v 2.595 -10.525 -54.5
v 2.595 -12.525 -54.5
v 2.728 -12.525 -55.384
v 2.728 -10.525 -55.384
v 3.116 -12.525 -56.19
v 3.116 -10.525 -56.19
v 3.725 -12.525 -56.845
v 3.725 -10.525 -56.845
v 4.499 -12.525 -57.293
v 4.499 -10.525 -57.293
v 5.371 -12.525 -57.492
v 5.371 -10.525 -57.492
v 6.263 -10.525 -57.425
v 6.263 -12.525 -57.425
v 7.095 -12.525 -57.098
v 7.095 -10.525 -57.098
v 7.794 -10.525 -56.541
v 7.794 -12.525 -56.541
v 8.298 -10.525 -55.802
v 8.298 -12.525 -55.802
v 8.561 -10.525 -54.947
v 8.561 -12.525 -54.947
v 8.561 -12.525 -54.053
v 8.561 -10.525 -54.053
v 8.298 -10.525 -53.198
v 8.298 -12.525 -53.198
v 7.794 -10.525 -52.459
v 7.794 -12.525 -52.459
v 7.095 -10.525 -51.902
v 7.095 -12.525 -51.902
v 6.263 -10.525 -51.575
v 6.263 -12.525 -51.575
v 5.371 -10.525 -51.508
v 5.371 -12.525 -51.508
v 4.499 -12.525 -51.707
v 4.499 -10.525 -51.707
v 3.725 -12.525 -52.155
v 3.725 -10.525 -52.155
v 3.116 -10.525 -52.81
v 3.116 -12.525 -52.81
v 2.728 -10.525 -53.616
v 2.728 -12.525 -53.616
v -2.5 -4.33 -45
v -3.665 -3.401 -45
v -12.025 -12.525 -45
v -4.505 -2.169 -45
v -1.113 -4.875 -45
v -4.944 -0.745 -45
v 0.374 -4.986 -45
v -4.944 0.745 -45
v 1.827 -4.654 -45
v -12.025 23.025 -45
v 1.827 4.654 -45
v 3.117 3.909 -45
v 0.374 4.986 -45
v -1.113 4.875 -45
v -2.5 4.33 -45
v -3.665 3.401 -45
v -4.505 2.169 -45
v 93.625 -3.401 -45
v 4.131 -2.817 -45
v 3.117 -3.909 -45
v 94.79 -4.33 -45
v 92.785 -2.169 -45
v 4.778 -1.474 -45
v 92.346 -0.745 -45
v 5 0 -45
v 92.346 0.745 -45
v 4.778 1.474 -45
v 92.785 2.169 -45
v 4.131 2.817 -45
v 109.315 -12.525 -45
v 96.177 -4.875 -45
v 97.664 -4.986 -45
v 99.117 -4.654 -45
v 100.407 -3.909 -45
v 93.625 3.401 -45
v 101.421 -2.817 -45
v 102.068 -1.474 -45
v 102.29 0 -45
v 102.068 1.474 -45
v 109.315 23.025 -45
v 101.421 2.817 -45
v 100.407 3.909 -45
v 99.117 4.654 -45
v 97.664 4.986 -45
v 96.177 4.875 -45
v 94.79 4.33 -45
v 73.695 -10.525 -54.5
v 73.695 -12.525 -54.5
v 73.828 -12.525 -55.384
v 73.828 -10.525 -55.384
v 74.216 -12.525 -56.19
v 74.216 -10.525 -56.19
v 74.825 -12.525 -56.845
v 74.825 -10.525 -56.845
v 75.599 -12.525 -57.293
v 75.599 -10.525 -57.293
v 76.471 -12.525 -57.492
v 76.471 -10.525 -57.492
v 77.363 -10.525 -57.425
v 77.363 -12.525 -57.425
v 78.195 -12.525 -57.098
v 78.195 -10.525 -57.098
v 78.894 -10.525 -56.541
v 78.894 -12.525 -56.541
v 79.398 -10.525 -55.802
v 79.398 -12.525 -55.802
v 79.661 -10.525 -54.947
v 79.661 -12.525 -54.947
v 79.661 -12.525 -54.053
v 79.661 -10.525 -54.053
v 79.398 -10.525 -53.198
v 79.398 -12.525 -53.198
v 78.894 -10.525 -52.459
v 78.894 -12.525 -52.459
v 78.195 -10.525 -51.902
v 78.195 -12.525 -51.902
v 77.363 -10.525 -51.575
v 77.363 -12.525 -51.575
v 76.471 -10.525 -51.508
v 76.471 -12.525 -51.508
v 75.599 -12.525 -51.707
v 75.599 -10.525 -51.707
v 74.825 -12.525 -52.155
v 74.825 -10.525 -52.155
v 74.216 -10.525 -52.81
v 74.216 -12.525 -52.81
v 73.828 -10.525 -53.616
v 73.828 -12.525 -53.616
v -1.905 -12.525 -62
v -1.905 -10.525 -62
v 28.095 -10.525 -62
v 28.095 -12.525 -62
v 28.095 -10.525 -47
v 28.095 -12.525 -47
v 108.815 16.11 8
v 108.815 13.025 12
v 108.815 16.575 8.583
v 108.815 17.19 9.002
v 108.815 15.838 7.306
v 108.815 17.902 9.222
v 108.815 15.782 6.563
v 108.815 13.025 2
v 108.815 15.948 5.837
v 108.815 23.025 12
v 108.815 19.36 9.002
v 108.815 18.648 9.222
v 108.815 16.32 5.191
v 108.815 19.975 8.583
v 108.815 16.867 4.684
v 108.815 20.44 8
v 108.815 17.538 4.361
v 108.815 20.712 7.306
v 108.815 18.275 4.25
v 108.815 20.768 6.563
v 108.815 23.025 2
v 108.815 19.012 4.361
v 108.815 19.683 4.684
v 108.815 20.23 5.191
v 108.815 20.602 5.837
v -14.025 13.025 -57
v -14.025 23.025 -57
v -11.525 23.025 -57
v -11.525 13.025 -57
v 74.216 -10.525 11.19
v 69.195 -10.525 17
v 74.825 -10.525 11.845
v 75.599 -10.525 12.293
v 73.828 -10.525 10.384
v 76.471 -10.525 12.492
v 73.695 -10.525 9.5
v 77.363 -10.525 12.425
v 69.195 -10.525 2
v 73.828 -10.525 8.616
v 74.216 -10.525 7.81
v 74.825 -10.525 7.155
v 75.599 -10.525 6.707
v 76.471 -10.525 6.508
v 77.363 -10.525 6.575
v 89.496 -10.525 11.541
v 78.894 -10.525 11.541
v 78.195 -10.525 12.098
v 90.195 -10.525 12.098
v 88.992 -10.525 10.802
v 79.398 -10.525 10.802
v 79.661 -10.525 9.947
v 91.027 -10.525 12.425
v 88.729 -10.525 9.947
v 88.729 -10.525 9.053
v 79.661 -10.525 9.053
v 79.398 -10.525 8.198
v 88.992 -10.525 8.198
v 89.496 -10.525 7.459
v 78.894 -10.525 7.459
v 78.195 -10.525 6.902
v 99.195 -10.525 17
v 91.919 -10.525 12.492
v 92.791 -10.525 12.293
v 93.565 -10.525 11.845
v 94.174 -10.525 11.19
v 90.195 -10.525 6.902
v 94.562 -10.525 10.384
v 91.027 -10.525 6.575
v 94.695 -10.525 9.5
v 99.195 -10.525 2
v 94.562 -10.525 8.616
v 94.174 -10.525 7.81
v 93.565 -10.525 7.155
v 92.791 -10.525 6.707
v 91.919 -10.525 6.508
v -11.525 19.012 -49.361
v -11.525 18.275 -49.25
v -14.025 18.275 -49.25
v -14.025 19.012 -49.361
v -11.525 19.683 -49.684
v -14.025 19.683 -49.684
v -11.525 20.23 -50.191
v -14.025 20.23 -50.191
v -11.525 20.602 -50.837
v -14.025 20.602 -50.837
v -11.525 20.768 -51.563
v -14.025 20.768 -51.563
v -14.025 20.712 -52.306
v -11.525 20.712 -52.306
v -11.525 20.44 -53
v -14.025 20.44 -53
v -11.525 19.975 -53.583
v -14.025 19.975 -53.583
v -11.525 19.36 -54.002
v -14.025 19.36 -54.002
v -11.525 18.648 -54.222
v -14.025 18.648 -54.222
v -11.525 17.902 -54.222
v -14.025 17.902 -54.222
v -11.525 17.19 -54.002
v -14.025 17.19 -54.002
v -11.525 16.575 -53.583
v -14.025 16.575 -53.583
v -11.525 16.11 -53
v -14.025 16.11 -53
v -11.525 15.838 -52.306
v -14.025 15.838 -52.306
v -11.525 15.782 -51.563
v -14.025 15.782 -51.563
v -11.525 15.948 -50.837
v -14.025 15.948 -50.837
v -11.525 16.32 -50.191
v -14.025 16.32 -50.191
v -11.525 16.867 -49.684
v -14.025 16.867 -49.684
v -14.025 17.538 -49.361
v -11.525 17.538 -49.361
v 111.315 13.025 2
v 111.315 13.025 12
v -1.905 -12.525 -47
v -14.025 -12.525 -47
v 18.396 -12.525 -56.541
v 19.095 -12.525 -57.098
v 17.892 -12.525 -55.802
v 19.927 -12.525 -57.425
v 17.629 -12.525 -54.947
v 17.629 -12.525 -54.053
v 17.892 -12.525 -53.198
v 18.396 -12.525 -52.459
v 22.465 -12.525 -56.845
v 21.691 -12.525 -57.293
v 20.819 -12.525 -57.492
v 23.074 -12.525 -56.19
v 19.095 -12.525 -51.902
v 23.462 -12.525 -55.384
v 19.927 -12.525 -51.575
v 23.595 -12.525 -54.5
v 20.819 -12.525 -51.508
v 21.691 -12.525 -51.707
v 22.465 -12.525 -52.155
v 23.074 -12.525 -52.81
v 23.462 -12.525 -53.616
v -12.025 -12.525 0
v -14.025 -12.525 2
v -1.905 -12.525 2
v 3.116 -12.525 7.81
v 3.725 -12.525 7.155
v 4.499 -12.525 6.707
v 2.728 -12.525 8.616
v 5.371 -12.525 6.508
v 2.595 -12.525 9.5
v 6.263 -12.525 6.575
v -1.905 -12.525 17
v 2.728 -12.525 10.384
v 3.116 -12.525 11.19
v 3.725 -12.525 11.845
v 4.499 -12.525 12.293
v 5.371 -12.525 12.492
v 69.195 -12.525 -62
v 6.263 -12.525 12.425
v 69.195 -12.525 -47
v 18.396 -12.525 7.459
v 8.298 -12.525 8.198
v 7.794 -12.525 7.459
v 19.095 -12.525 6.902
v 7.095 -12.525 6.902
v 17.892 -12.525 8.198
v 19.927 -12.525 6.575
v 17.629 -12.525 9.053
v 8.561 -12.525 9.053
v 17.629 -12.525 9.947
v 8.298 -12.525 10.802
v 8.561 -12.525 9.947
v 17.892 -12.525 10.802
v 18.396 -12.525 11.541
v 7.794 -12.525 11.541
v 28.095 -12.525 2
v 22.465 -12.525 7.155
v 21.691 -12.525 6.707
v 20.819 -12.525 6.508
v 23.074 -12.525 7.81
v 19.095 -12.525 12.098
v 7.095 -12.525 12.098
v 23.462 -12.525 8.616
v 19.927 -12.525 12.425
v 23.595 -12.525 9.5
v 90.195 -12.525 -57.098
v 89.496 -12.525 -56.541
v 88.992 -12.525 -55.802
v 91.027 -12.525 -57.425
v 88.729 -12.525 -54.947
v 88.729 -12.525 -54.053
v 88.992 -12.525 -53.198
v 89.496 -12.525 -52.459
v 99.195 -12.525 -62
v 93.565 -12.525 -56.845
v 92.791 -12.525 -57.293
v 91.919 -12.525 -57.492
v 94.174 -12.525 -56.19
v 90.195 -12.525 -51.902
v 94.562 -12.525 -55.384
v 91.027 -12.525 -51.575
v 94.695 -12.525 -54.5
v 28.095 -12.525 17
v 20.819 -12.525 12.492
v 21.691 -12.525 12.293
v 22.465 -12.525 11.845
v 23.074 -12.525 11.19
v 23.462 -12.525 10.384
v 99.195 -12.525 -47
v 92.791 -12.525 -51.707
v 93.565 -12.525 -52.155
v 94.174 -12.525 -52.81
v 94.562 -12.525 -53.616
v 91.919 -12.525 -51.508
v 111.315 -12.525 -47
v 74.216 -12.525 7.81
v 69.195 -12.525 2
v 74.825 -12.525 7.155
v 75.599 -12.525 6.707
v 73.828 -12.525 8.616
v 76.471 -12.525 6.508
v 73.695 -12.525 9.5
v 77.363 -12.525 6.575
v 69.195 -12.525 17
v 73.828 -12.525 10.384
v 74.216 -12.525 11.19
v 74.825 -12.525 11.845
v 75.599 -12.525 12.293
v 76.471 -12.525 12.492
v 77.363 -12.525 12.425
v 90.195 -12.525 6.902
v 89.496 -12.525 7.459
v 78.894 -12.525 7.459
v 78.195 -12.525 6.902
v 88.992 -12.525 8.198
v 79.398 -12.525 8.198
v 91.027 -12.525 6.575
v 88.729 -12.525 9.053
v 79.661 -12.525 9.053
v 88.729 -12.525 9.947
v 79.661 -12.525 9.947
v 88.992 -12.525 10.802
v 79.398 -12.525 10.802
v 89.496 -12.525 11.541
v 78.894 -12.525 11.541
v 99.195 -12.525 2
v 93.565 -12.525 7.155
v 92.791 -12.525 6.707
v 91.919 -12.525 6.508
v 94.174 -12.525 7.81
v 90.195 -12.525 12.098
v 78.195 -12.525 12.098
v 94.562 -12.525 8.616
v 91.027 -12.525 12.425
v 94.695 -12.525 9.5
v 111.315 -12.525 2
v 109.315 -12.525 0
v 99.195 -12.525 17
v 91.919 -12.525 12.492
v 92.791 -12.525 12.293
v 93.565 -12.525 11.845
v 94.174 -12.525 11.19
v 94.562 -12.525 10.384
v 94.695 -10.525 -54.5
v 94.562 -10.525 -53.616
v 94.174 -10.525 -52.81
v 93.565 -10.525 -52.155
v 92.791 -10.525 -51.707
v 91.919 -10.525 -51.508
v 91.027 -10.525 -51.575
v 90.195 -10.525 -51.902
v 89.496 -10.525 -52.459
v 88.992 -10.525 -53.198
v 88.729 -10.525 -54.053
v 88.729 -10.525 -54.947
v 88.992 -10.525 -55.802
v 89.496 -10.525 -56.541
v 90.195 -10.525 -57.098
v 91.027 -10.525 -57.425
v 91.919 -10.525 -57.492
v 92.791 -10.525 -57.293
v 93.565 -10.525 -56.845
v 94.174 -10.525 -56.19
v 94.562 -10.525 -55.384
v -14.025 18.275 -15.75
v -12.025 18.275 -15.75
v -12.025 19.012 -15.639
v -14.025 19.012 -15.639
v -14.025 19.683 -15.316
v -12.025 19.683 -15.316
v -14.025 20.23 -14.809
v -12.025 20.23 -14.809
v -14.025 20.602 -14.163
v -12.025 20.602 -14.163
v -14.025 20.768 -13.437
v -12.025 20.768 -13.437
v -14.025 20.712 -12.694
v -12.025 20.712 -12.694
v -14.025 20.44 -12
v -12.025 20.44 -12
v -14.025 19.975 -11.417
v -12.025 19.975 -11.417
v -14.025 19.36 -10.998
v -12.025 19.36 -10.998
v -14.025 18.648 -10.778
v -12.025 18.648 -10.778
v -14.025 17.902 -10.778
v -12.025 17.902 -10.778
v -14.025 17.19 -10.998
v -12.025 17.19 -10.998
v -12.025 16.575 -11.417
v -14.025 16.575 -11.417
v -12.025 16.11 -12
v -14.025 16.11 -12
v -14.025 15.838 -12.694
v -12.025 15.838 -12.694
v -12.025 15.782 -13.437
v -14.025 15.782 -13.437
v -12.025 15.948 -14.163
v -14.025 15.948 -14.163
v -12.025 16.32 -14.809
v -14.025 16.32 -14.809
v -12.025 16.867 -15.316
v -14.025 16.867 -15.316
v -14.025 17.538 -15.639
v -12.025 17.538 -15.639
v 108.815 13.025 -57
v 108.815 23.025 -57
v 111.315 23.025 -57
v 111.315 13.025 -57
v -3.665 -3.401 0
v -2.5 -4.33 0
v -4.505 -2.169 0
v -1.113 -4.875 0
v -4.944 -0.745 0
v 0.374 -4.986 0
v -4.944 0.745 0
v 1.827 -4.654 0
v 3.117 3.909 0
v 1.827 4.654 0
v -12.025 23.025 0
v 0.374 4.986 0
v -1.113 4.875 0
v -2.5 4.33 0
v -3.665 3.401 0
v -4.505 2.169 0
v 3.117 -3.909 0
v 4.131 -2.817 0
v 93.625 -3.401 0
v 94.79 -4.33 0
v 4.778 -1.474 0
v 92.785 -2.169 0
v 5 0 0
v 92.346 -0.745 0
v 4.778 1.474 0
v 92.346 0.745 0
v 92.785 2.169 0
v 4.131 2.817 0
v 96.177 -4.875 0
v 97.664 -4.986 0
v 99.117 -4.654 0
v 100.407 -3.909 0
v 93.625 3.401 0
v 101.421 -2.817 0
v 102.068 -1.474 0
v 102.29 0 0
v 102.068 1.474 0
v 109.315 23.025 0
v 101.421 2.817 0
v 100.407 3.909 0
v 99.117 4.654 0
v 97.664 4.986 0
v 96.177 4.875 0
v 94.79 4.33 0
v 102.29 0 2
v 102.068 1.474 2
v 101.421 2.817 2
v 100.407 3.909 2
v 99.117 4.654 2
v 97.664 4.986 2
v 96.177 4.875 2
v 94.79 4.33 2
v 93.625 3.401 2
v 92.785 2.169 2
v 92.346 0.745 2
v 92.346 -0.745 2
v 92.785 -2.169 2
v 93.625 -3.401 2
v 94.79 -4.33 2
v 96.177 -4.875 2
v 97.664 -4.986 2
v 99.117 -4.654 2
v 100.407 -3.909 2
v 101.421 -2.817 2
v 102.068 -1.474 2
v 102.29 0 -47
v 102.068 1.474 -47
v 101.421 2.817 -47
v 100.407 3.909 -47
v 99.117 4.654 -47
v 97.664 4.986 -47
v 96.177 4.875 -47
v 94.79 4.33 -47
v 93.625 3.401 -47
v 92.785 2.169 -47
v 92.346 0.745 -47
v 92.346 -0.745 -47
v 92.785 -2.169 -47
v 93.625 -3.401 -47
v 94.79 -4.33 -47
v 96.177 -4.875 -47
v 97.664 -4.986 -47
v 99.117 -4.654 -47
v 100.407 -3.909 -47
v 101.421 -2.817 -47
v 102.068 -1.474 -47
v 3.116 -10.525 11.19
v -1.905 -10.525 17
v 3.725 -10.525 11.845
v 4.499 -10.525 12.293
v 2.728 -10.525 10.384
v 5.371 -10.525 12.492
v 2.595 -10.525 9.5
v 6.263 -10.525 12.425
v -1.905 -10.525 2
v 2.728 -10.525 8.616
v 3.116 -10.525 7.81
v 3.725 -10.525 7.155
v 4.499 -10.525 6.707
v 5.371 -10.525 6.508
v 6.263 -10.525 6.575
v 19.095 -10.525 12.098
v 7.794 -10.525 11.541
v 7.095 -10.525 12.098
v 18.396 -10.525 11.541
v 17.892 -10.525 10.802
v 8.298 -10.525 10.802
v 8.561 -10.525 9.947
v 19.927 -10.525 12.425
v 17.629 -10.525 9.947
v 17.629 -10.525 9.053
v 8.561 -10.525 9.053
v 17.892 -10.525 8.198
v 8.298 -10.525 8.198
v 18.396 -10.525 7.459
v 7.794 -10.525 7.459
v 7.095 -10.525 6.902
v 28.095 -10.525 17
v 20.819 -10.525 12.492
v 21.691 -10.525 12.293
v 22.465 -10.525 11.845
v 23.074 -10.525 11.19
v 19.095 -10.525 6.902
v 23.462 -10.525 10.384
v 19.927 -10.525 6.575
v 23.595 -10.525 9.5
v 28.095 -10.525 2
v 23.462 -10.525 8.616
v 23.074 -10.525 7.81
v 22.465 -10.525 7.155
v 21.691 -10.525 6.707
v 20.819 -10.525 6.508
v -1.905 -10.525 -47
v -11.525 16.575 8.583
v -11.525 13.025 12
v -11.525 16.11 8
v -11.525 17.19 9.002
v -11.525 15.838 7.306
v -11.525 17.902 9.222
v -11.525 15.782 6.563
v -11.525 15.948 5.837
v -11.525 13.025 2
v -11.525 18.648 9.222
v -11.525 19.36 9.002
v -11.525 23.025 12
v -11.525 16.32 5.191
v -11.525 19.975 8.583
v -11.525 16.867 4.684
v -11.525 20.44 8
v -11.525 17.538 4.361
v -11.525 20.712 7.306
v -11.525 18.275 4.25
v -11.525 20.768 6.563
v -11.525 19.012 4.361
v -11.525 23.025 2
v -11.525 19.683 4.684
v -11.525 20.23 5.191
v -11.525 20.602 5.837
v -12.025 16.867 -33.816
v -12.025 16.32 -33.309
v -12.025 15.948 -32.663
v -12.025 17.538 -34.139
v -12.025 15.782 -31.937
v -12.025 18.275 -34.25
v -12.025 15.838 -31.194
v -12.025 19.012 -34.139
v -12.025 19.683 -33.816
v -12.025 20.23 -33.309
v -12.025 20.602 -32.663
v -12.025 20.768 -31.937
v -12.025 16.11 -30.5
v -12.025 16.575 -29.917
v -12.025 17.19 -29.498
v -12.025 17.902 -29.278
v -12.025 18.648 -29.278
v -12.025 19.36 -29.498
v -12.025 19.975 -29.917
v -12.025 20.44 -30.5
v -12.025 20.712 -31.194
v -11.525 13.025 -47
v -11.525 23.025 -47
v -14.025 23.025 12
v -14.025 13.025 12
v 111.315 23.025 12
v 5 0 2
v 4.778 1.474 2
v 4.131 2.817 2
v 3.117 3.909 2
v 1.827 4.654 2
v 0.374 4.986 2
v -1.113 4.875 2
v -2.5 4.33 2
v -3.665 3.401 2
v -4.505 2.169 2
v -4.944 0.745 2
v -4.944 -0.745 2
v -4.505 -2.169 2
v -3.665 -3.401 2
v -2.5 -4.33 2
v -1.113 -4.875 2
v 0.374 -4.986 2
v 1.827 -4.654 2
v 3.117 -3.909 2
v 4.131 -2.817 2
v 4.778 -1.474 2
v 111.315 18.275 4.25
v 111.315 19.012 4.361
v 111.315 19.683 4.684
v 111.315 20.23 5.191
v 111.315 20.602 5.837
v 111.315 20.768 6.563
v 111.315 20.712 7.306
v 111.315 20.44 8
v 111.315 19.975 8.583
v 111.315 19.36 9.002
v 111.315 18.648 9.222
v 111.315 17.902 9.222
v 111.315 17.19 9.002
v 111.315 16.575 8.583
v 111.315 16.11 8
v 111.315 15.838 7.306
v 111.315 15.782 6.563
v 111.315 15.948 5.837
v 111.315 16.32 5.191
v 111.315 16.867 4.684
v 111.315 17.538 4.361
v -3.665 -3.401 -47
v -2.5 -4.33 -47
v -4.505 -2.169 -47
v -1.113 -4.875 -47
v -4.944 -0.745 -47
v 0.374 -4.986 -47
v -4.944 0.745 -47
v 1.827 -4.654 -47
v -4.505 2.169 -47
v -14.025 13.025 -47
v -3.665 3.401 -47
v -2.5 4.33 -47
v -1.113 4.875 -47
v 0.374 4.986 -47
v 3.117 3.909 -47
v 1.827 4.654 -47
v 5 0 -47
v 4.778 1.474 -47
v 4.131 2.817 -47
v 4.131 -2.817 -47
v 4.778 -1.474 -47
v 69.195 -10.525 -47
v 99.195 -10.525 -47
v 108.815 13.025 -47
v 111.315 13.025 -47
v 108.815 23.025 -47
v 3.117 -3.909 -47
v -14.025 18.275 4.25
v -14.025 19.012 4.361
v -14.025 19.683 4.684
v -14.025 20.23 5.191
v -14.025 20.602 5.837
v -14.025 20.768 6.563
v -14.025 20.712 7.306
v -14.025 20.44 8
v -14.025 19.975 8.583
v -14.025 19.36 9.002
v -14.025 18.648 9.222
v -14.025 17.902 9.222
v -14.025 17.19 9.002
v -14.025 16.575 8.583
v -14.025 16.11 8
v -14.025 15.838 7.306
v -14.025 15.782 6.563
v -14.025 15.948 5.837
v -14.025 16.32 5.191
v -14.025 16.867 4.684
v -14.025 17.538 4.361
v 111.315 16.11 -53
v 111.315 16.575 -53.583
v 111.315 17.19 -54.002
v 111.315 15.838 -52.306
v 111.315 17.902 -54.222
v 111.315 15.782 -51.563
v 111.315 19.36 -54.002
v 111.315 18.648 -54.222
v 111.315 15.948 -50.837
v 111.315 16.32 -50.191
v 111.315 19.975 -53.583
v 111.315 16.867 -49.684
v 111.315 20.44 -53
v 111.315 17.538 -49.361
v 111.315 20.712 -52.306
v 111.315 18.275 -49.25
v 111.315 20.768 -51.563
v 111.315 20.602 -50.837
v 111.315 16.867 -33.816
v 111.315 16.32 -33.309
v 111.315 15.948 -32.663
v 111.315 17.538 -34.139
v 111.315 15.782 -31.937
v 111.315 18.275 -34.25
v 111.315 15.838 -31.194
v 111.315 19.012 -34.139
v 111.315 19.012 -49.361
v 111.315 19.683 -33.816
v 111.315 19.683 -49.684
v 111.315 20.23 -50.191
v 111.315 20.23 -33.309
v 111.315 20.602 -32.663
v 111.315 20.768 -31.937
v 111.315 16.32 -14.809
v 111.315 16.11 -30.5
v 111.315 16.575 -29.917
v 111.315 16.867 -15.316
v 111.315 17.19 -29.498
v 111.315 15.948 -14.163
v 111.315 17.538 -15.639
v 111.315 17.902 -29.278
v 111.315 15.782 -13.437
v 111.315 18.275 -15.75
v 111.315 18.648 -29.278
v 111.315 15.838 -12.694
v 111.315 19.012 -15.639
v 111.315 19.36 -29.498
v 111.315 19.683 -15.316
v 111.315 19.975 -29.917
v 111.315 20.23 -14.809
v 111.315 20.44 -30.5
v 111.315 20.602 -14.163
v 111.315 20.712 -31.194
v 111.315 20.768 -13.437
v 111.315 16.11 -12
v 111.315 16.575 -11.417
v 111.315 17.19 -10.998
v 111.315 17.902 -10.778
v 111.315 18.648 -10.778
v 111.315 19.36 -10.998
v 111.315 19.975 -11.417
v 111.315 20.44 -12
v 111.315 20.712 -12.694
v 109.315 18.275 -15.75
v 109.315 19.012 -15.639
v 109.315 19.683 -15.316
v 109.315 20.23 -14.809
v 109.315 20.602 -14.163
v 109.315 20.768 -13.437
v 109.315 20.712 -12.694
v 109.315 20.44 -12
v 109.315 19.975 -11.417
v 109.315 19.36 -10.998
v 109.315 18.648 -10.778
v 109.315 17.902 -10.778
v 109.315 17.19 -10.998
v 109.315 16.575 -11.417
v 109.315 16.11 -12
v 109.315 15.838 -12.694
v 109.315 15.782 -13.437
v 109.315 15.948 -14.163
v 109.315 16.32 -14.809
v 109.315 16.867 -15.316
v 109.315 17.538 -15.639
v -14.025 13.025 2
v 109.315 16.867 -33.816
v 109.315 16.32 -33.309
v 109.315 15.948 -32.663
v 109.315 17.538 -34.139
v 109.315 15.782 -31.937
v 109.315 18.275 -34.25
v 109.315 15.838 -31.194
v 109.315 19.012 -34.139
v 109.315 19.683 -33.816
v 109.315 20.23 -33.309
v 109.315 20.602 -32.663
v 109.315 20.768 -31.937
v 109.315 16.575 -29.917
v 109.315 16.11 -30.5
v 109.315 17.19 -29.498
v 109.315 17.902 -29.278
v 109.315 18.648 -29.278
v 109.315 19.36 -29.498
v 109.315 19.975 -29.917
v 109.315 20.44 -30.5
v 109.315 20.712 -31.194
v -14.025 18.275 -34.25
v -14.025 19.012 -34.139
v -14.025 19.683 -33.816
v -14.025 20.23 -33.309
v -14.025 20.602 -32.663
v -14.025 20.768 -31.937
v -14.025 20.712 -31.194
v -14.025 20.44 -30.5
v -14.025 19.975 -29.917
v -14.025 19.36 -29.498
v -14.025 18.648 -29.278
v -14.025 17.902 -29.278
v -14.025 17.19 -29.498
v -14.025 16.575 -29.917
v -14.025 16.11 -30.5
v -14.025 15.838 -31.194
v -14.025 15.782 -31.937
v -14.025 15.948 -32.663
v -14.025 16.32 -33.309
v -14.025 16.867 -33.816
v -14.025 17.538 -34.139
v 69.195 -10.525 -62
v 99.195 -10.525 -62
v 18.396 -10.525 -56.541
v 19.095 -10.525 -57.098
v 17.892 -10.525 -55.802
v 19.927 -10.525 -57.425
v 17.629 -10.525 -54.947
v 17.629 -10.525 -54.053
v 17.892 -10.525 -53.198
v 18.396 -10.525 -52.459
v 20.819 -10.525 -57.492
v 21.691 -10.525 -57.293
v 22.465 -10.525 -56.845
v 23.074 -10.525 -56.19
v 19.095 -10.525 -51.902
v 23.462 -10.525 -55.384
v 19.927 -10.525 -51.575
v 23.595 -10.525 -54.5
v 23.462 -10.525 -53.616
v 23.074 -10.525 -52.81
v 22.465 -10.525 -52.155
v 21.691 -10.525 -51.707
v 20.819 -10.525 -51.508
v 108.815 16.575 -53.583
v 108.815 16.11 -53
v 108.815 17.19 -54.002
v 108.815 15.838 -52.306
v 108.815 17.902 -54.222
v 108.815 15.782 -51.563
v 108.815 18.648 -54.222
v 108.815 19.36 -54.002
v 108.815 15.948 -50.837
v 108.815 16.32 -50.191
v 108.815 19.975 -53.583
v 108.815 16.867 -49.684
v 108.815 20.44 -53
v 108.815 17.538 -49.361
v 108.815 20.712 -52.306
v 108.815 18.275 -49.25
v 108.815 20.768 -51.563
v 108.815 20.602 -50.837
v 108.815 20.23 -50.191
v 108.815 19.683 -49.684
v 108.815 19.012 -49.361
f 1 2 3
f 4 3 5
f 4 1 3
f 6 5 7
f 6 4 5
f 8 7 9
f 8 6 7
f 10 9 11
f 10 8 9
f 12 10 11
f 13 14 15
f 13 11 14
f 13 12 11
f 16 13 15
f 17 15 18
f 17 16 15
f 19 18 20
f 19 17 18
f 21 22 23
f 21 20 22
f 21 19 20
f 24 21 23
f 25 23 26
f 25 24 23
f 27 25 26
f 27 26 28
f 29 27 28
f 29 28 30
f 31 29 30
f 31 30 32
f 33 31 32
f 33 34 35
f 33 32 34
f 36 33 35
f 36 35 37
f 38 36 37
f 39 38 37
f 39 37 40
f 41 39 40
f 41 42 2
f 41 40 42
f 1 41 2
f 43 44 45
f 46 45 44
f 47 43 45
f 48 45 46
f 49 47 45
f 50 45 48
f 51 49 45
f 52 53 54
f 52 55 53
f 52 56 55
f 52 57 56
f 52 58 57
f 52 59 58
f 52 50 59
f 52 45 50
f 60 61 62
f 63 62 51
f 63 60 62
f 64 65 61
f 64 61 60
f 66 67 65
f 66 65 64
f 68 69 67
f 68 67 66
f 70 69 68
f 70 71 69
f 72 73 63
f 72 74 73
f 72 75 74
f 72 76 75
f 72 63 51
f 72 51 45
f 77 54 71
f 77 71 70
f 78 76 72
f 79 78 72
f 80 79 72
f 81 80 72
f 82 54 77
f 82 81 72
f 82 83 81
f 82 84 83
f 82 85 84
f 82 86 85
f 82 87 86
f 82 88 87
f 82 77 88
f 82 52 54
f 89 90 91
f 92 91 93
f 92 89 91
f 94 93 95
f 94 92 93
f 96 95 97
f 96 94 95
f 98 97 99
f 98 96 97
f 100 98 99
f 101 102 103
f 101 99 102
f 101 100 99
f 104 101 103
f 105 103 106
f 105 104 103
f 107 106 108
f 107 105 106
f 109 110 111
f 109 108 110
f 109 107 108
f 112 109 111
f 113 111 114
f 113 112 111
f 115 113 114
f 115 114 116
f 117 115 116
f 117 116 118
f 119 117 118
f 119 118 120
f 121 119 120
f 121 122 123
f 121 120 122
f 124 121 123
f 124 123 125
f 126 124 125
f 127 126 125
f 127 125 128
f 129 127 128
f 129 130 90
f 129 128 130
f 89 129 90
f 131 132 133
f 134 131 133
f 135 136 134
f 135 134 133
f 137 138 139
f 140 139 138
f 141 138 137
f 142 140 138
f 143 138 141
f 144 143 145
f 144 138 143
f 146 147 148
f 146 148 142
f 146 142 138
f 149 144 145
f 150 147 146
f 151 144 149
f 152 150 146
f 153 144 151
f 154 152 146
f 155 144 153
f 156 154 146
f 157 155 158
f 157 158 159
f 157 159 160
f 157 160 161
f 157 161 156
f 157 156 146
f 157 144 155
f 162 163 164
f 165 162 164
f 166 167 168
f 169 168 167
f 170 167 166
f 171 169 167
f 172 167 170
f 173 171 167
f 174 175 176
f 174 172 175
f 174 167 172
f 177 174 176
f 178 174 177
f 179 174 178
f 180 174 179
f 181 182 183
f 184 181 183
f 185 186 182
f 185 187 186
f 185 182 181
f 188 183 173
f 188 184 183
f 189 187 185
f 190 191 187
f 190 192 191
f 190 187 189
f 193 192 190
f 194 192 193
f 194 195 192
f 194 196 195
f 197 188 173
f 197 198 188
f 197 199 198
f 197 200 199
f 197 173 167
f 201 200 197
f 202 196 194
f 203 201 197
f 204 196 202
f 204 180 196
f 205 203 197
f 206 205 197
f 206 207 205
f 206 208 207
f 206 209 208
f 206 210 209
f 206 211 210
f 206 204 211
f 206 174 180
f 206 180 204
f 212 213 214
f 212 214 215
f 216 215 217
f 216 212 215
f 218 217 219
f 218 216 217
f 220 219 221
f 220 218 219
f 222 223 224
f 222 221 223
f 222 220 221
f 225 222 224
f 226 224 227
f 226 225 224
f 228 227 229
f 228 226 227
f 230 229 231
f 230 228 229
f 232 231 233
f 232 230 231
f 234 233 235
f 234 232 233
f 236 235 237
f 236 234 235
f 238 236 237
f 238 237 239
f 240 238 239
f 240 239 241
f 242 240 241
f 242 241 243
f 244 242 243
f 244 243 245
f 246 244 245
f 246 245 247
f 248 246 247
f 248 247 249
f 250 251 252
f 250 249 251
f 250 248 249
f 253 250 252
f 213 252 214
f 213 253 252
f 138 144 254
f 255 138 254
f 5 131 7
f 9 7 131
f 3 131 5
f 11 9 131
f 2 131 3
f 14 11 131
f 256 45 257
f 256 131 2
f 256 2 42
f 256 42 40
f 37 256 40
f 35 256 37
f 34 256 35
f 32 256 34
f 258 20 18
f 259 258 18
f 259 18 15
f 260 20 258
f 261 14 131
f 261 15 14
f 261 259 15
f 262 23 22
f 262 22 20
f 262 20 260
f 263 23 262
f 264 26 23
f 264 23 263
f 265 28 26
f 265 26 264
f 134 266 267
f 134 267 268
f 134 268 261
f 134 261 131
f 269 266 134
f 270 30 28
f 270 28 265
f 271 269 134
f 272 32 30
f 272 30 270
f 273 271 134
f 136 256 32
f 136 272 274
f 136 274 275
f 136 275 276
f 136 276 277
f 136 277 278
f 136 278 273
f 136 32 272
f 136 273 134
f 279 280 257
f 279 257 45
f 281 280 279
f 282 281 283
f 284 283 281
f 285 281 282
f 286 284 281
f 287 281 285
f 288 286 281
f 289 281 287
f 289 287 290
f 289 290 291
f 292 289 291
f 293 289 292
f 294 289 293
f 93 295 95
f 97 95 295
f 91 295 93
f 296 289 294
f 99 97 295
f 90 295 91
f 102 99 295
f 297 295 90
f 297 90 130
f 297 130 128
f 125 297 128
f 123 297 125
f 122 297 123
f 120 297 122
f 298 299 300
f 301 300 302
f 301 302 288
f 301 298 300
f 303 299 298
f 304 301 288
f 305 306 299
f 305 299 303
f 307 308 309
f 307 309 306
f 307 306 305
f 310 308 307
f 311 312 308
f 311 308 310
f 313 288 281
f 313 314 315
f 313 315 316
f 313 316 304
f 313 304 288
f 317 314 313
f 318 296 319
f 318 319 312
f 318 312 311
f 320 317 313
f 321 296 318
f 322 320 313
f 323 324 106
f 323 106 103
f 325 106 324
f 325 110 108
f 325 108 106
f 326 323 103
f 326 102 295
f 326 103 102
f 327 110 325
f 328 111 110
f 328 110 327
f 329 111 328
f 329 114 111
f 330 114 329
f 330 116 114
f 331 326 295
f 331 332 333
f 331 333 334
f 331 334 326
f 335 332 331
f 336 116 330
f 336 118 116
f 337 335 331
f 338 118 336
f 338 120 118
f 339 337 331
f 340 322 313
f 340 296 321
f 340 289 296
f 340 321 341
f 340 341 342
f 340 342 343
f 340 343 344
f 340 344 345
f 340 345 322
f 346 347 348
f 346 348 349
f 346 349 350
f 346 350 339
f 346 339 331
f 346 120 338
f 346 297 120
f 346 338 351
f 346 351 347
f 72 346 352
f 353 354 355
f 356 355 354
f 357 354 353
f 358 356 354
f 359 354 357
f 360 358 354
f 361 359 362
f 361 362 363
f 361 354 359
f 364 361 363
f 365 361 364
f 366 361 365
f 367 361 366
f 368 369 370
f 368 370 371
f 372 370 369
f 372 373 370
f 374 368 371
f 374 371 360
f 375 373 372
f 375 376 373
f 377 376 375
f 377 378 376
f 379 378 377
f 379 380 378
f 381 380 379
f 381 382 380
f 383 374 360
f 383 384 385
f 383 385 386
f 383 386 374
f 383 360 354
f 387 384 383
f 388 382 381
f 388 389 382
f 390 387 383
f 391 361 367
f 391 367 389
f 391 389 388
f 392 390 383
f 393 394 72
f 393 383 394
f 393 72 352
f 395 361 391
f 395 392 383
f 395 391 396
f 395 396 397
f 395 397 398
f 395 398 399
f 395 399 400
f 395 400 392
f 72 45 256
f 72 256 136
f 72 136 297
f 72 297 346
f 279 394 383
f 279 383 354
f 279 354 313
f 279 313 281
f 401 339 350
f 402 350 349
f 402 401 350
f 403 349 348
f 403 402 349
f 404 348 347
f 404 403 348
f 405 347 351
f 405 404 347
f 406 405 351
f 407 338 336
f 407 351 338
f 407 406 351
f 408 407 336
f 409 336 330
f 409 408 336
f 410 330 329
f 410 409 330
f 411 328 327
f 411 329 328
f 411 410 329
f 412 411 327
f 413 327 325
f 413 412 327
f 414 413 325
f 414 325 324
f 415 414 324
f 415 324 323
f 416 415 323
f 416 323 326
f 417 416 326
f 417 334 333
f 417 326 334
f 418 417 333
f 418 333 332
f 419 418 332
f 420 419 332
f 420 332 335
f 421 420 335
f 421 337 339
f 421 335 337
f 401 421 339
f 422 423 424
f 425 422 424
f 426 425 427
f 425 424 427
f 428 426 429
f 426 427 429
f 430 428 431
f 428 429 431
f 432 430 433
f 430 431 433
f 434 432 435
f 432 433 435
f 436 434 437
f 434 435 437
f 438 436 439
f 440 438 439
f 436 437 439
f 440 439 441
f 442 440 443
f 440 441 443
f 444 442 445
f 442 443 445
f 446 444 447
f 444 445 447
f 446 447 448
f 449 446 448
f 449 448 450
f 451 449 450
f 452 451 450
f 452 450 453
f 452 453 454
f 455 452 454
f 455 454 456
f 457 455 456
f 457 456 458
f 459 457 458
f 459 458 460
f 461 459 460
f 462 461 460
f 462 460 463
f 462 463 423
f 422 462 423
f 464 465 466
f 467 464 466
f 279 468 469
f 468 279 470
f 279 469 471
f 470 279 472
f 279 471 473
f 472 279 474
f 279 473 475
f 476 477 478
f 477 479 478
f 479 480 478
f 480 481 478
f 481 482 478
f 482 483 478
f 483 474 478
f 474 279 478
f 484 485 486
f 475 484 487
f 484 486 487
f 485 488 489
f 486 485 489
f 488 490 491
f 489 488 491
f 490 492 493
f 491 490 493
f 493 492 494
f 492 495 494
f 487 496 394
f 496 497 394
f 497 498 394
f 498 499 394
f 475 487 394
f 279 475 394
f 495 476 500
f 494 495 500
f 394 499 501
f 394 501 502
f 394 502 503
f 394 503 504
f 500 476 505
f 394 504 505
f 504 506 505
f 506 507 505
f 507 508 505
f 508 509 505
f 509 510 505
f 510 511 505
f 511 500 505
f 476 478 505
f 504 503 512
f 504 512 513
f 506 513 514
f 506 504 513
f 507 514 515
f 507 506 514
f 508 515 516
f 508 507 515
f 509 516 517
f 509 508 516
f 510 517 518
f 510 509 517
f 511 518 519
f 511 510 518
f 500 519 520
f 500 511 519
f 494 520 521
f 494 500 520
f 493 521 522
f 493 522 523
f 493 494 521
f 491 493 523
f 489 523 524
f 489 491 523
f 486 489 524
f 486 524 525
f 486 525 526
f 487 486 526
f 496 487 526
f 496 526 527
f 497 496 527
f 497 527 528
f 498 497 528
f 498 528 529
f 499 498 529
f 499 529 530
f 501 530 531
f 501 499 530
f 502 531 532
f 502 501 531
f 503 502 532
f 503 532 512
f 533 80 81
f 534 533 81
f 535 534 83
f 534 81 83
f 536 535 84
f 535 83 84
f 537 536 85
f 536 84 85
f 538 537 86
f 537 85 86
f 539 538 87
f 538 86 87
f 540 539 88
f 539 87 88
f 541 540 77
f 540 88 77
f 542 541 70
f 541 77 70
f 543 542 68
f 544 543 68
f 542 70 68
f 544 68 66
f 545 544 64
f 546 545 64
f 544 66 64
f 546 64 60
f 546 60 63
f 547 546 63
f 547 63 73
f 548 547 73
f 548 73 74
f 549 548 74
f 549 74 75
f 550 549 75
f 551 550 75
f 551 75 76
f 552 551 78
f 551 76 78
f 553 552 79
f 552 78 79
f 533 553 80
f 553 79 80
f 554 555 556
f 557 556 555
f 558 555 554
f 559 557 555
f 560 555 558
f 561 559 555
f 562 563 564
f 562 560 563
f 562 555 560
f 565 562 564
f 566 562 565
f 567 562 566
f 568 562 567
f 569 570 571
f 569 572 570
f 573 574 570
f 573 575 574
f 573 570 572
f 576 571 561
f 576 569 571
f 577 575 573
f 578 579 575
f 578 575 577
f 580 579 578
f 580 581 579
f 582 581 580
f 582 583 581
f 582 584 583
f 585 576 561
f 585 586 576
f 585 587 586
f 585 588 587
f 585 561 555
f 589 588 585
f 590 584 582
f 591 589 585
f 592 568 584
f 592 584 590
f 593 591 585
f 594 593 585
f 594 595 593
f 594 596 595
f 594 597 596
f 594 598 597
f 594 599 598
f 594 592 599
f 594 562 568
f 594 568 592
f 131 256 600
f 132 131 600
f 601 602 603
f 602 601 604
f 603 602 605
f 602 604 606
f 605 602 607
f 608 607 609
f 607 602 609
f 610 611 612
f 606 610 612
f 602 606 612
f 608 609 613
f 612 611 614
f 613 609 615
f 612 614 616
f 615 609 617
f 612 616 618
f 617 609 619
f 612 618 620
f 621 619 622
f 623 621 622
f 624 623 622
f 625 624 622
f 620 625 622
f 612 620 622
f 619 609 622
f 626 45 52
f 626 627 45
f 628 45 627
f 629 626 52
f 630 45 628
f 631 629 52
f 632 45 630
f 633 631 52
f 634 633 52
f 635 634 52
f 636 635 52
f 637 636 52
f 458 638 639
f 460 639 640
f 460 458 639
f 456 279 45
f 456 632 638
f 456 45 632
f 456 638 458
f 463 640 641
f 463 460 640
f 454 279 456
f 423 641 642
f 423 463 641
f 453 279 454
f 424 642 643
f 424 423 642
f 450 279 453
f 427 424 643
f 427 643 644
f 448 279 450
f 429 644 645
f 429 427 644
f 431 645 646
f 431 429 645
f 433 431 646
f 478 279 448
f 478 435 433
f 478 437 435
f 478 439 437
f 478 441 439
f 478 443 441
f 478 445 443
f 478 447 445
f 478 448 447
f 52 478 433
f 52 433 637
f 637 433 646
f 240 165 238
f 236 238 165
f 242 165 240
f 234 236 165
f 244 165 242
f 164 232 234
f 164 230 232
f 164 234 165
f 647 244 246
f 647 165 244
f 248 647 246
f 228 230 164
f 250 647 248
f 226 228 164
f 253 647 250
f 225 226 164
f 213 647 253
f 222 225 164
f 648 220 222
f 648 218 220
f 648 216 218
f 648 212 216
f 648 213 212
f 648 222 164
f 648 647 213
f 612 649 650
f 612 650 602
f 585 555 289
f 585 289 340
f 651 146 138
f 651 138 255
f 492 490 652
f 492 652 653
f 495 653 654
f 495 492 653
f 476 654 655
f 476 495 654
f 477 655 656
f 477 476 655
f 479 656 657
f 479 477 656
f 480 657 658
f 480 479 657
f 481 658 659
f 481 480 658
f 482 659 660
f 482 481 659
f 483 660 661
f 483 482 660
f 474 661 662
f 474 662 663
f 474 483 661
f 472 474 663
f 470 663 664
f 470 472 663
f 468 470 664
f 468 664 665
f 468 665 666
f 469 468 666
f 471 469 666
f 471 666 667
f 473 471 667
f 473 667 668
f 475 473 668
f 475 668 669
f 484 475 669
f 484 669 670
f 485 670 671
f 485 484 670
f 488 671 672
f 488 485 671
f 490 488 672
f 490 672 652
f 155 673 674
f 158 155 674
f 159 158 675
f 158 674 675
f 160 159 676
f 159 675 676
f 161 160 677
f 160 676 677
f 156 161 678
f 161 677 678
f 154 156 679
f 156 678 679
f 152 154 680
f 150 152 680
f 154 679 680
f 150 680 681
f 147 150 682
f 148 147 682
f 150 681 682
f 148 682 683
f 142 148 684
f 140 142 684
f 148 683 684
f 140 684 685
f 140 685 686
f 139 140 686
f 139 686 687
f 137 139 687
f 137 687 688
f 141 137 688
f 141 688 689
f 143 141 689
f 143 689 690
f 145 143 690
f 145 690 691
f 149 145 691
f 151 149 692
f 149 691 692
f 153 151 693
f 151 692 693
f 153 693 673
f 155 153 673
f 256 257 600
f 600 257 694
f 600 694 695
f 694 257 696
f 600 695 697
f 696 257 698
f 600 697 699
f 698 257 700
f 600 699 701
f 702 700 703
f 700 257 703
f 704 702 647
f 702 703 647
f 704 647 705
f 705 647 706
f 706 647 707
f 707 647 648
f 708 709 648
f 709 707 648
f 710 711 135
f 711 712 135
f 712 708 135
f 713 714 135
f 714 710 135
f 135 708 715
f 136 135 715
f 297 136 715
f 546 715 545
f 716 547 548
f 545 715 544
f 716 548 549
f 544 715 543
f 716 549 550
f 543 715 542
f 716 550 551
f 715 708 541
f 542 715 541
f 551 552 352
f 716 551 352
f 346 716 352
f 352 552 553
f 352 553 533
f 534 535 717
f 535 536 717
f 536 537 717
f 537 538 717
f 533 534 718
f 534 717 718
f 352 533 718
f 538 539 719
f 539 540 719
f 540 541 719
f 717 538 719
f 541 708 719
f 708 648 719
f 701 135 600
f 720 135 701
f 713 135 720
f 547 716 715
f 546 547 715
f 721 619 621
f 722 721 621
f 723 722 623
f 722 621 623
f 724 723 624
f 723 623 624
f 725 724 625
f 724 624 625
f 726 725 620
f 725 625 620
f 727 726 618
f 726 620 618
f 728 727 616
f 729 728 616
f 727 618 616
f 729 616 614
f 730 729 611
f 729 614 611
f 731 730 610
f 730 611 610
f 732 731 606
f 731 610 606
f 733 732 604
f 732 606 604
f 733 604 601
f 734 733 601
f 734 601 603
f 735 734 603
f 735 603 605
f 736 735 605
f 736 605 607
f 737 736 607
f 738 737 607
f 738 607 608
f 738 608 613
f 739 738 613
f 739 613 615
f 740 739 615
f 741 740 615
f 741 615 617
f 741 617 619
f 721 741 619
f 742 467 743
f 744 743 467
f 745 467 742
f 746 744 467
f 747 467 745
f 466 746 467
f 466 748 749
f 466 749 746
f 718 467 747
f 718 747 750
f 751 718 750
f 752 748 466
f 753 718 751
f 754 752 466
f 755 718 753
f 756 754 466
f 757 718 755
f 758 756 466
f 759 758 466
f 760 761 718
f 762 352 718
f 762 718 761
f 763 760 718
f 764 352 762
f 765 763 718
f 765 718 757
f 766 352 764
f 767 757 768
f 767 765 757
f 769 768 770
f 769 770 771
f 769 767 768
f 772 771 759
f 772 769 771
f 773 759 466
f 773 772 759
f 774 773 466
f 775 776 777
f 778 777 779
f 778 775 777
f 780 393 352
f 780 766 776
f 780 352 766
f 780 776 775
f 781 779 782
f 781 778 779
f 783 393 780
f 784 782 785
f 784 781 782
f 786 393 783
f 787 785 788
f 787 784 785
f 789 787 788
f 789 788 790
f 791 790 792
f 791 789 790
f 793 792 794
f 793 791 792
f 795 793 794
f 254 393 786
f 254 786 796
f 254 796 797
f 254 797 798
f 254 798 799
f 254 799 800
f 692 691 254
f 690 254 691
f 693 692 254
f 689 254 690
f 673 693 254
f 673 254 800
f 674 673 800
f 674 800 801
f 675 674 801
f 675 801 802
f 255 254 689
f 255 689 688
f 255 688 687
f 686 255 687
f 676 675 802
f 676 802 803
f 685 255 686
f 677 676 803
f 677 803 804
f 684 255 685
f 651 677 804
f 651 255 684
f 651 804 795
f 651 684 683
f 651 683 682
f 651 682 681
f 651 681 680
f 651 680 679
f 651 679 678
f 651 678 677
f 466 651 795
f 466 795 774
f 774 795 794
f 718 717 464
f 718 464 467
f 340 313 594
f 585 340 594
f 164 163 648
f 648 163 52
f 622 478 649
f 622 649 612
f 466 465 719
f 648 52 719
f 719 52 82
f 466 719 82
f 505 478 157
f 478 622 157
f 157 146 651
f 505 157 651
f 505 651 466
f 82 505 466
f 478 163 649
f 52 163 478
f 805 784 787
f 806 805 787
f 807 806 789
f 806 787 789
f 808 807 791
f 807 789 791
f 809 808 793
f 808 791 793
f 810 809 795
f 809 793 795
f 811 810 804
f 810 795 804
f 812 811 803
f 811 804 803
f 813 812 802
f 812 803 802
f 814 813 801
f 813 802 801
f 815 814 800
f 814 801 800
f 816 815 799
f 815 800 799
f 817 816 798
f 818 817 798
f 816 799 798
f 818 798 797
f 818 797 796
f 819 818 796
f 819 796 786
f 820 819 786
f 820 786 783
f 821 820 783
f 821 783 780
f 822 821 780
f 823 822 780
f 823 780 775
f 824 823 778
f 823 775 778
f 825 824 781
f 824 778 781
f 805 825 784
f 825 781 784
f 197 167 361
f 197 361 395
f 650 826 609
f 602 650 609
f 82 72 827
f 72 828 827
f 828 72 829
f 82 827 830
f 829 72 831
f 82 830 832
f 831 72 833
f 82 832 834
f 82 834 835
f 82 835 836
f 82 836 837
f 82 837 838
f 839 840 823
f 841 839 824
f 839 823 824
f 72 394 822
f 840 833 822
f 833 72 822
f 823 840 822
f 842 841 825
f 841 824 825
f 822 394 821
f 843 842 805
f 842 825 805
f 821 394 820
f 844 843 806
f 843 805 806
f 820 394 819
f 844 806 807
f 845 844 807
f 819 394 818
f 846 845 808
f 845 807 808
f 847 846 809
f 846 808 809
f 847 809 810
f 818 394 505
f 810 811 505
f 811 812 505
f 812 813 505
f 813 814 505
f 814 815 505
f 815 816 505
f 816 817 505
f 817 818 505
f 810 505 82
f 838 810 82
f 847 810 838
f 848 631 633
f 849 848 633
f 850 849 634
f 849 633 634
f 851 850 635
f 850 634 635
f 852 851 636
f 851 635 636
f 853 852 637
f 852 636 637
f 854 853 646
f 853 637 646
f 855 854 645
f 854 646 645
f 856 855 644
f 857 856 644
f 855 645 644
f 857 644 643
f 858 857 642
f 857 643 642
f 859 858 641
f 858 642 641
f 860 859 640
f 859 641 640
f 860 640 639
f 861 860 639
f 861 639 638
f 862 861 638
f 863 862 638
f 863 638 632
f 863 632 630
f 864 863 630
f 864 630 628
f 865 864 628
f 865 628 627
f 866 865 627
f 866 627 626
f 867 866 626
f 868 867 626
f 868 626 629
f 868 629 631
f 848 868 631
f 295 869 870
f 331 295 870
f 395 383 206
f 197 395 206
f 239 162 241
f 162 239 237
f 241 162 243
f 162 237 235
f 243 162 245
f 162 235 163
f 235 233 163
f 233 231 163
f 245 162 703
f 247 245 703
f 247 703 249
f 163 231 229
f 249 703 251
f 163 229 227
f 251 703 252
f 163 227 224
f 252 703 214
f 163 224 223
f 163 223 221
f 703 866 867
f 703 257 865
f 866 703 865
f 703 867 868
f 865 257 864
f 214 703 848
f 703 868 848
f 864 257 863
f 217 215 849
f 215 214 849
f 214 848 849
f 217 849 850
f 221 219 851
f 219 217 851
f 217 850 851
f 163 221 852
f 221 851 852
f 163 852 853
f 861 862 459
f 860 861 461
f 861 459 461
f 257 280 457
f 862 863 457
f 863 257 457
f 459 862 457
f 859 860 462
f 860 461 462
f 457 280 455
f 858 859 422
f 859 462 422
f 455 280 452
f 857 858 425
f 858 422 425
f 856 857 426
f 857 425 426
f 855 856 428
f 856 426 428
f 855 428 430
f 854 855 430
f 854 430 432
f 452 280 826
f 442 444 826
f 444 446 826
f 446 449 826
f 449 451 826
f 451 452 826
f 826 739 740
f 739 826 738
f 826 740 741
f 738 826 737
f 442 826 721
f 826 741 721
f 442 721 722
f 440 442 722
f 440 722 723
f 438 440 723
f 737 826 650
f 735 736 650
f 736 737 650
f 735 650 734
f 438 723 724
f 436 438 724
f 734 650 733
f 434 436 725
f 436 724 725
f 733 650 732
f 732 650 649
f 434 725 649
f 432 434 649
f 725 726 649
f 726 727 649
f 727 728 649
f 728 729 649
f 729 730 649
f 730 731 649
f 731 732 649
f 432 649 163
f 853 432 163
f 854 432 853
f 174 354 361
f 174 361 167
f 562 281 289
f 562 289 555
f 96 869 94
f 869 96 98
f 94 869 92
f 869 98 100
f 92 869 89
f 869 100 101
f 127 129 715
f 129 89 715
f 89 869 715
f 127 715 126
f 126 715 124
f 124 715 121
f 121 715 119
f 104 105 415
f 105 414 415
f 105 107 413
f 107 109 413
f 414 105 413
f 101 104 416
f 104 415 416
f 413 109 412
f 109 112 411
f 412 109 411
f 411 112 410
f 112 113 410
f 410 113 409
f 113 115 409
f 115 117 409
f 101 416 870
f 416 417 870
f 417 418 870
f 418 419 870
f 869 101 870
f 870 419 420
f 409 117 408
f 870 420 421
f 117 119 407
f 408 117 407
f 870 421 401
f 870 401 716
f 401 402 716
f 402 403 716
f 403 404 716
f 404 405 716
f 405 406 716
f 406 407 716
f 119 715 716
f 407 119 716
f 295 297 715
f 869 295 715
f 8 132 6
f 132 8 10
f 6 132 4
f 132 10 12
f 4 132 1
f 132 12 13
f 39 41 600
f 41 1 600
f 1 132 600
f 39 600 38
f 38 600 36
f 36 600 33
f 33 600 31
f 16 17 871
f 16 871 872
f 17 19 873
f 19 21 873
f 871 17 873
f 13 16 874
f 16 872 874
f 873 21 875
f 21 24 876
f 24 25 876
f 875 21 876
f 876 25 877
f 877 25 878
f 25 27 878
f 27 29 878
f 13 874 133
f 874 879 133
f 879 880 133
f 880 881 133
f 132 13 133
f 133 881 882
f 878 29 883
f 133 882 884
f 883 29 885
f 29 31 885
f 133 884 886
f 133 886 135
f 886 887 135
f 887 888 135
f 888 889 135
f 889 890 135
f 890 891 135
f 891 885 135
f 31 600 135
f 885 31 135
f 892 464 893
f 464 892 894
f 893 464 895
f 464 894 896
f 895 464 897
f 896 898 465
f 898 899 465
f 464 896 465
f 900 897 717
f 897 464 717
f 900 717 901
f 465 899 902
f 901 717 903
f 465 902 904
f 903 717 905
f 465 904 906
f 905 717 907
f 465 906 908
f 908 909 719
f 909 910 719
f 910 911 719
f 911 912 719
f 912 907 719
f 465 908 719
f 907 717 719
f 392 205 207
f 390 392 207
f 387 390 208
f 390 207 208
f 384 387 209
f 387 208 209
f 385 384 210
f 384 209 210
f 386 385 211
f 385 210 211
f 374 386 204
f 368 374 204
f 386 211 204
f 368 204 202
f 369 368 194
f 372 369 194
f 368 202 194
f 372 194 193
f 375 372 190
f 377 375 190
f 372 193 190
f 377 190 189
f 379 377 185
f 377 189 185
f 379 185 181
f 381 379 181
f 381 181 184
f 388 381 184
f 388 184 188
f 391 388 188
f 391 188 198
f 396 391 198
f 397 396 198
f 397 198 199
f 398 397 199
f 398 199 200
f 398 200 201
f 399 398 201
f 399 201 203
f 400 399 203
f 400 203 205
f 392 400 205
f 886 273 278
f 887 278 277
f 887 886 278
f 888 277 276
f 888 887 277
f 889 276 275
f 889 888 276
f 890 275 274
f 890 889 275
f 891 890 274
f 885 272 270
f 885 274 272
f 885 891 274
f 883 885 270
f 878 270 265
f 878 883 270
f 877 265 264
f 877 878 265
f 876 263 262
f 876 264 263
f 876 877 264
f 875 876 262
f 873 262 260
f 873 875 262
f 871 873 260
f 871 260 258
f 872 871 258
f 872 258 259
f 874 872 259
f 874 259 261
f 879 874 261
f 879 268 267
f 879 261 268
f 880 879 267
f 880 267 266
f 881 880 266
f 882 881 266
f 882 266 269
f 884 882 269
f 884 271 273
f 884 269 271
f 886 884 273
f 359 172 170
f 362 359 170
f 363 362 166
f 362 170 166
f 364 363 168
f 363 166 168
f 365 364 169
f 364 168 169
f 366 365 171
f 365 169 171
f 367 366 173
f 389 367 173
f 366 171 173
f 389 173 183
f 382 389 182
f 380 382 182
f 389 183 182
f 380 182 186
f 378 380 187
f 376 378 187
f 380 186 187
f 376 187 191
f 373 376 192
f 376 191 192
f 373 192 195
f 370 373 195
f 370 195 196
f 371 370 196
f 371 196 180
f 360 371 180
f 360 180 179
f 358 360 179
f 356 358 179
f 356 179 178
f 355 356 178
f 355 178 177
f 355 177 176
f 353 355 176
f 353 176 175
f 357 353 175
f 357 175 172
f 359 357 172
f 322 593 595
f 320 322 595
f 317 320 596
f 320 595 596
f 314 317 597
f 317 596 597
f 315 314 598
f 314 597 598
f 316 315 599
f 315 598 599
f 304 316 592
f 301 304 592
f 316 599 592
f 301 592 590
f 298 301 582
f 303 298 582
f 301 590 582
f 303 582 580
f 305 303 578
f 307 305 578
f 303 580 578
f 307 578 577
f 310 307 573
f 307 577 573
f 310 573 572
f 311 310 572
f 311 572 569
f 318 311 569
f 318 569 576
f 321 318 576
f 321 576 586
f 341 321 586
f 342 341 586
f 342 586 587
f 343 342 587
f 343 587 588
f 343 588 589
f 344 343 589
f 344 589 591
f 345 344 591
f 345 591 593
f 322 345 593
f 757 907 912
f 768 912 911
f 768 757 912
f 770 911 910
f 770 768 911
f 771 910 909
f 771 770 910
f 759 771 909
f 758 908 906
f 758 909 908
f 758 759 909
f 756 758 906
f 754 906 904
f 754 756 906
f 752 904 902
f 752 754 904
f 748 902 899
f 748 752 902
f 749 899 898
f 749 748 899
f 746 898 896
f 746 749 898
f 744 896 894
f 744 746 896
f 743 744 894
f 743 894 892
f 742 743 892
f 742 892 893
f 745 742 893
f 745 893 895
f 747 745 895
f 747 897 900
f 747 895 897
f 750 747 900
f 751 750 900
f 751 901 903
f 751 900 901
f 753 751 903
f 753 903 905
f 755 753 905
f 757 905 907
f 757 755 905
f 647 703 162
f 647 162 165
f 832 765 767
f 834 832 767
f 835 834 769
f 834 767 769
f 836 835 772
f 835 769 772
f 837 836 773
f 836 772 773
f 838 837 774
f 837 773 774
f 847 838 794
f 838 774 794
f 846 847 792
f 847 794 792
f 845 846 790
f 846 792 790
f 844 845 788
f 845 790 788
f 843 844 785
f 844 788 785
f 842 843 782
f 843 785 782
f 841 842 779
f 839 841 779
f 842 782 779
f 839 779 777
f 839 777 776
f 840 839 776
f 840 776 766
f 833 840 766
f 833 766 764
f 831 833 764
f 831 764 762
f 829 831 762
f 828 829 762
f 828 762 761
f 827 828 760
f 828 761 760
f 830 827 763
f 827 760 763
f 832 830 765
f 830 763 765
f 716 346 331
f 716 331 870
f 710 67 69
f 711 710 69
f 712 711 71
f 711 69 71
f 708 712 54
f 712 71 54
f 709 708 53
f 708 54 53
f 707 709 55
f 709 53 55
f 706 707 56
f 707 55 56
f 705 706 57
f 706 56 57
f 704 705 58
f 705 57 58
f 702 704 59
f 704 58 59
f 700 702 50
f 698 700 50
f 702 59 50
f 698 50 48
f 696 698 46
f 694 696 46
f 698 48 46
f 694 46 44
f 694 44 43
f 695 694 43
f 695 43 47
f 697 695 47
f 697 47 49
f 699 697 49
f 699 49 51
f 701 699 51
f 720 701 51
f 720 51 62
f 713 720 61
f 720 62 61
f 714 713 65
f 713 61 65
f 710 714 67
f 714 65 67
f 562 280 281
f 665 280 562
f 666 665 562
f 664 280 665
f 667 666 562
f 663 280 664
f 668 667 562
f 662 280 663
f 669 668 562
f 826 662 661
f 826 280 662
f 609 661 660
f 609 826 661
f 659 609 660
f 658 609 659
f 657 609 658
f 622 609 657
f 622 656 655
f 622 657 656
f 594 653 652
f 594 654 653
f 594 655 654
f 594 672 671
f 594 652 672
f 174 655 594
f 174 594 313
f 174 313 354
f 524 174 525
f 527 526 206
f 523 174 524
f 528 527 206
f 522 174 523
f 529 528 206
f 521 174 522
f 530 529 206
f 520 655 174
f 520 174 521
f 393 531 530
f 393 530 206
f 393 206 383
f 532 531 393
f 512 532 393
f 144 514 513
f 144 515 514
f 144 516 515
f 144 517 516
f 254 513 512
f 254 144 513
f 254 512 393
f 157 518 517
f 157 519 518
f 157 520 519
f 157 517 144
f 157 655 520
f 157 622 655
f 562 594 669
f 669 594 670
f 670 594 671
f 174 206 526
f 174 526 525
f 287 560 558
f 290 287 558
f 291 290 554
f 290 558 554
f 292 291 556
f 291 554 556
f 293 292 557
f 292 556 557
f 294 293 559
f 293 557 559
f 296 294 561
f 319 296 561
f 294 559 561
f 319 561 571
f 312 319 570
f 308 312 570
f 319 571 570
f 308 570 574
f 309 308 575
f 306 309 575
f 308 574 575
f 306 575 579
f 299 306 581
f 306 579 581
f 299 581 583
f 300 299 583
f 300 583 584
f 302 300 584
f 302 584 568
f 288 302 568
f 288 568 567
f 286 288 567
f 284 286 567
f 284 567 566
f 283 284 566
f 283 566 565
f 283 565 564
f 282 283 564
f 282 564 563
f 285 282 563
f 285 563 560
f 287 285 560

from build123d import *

# Parameters (mm, degrees)
SKETCH1_W           = 125.34
SKETCH1_H           = 35.55
SKETCH1_R           = 5
BOSS_EXTRUDE1_DEPTH = 2
SKETCH2_W           = 2
SKETCH2_H           = 35.55
BOSS_EXTRUDE2_DEPTH = 45
SKETCH4_W           = 30
SKETCH4_H           = 2
BOSS_EXTRUDE3_DEPTH = 15
SKETCH5_W           = 2.5
SKETCH5_H           = 10
BOSS_EXTRUDE4_DEPTH = 10
SKETCH3_R           = 2.5
CUT_EXTRUDE1_DEPTH  = 136.149051883
SKETCH6_R           = 3
CUT_EXTRUDE2_DEPTH  = 125.666080892


with BuildPart() as part:
    # Sketch1 → Boss-Extrude1 (new body)
    with BuildSketch(Plane.XY):
        with Locations((48.645, 5.25)):
            Rectangle(SKETCH1_W, SKETCH1_H)
        Circle(SKETCH1_R, mode=Mode.SUBTRACT)
        with Locations((97.29, 0)):
            Circle(SKETCH1_R, mode=Mode.SUBTRACT)
    boss_extrude1 = extrude(amount=BOSS_EXTRUDE1_DEPTH)

    # Sketch2 → Boss-Extrude2 (add)
    with BuildSketch(Plane(origin=(0, 0, 0), x_dir=(-1, 0, 0), z_dir=(0, 0, -1))):
        with Locations((-110.315, 5.25)):
            Rectangle(SKETCH2_W, SKETCH2_H)
    boss_extrude2 = extrude(amount=BOSS_EXTRUDE2_DEPTH)

    # Mirror1: Boss-Extrude2 across plane
    add(boss_extrude2.mirror(Plane(origin=(48.645, 0, 0), x_dir=(0, 0, 1), z_dir=(1, 0, 0))))

    # Sketch4 → Boss-Extrude3 (add)
    with BuildSketch(Plane.XY.offset(2)):
        with Locations((13.095, -11.525)):
            Rectangle(SKETCH4_W, SKETCH4_H)
        with Locations((84.195, -11.525)):
            Rectangle(SKETCH4_W, SKETCH4_H)
    boss_extrude3 = extrude(amount=BOSS_EXTRUDE3_DEPTH)

    # Sketch5 → Boss-Extrude4 (add)
    with BuildSketch(Plane.XY.offset(2)):
        with Locations((-12.775, 18.025)):
            Rectangle(SKETCH5_W, SKETCH5_H)
        with Locations((110.065, 18.025)):
            Rectangle(SKETCH5_W, SKETCH5_H)
    boss_extrude4 = extrude(amount=BOSS_EXTRUDE4_DEPTH)

    # Sketch3 → Cut-Extrude1 (cut, through all)
    with BuildSketch(Plane(origin=(111.315, 0, 0), x_dir=(0, 0, -1), z_dir=(1, 0, 0))):
        with Locations((13.25, 18.275)):
            Circle(SKETCH3_R)
        with Locations((31.75, 18.275)):
            Circle(SKETCH3_R)
        with Locations((-6.75, 18.275)):
            Circle(SKETCH3_R)
        with Locations((51.75, 18.275)):
            Circle(SKETCH3_R)
    cut_extrude1 = extrude(amount=-CUT_EXTRUDE1_DEPTH, mode=Mode.SUBTRACT)

    # Sketch6 → Cut-Extrude2 (cut, through all)
    with BuildSketch(Plane(origin=(0, -10.525, 0), x_dir=(1, 0, 0), z_dir=(0, 1, 0))):
        with Locations(Location((5.595, -9.5, 0), (0, 0, 180))):
            Circle(SKETCH6_R)
        with Locations((20.595, -9.5)):
            Circle(SKETCH6_R)
        with Locations((91.695, -9.5)):
            Circle(SKETCH6_R)
        with Locations(Location((76.695, -9.5, 0), (0, 0, 180))):
            Circle(SKETCH6_R)
    cut_extrude2 = extrude(amount=-CUT_EXTRUDE2_DEPTH, mode=Mode.SUBTRACT)

    # Mirror2: Boss-Extrude1, Boss-Extrude3, Boss-Extrude4, Cut-Extrude1, Cut-Extrude2 across plane
    add(boss_extrude1.mirror(Plane(origin=(0, 0, -22.5), x_dir=(1, 0, 0), z_dir=(0, 0, -1))))
    add(boss_extrude3.mirror(Plane(origin=(0, 0, -22.5), x_dir=(1, 0, 0), z_dir=(0, 0, -1))))
    add(boss_extrude4.mirror(Plane(origin=(0, 0, -22.5), x_dir=(1, 0, 0), z_dir=(0, 0, -1))))
    add(cut_extrude1.mirror(Plane(origin=(0, 0, -22.5), x_dir=(1, 0, 0), z_dir=(0, 0, -1))), mode=Mode.SUBTRACT)
    add(cut_extrude2.mirror(Plane(origin=(0, 0, -22.5), x_dir=(1, 0, 0), z_dir=(0, 0, -1))), mode=Mode.SUBTRACT)


solid = part.part
